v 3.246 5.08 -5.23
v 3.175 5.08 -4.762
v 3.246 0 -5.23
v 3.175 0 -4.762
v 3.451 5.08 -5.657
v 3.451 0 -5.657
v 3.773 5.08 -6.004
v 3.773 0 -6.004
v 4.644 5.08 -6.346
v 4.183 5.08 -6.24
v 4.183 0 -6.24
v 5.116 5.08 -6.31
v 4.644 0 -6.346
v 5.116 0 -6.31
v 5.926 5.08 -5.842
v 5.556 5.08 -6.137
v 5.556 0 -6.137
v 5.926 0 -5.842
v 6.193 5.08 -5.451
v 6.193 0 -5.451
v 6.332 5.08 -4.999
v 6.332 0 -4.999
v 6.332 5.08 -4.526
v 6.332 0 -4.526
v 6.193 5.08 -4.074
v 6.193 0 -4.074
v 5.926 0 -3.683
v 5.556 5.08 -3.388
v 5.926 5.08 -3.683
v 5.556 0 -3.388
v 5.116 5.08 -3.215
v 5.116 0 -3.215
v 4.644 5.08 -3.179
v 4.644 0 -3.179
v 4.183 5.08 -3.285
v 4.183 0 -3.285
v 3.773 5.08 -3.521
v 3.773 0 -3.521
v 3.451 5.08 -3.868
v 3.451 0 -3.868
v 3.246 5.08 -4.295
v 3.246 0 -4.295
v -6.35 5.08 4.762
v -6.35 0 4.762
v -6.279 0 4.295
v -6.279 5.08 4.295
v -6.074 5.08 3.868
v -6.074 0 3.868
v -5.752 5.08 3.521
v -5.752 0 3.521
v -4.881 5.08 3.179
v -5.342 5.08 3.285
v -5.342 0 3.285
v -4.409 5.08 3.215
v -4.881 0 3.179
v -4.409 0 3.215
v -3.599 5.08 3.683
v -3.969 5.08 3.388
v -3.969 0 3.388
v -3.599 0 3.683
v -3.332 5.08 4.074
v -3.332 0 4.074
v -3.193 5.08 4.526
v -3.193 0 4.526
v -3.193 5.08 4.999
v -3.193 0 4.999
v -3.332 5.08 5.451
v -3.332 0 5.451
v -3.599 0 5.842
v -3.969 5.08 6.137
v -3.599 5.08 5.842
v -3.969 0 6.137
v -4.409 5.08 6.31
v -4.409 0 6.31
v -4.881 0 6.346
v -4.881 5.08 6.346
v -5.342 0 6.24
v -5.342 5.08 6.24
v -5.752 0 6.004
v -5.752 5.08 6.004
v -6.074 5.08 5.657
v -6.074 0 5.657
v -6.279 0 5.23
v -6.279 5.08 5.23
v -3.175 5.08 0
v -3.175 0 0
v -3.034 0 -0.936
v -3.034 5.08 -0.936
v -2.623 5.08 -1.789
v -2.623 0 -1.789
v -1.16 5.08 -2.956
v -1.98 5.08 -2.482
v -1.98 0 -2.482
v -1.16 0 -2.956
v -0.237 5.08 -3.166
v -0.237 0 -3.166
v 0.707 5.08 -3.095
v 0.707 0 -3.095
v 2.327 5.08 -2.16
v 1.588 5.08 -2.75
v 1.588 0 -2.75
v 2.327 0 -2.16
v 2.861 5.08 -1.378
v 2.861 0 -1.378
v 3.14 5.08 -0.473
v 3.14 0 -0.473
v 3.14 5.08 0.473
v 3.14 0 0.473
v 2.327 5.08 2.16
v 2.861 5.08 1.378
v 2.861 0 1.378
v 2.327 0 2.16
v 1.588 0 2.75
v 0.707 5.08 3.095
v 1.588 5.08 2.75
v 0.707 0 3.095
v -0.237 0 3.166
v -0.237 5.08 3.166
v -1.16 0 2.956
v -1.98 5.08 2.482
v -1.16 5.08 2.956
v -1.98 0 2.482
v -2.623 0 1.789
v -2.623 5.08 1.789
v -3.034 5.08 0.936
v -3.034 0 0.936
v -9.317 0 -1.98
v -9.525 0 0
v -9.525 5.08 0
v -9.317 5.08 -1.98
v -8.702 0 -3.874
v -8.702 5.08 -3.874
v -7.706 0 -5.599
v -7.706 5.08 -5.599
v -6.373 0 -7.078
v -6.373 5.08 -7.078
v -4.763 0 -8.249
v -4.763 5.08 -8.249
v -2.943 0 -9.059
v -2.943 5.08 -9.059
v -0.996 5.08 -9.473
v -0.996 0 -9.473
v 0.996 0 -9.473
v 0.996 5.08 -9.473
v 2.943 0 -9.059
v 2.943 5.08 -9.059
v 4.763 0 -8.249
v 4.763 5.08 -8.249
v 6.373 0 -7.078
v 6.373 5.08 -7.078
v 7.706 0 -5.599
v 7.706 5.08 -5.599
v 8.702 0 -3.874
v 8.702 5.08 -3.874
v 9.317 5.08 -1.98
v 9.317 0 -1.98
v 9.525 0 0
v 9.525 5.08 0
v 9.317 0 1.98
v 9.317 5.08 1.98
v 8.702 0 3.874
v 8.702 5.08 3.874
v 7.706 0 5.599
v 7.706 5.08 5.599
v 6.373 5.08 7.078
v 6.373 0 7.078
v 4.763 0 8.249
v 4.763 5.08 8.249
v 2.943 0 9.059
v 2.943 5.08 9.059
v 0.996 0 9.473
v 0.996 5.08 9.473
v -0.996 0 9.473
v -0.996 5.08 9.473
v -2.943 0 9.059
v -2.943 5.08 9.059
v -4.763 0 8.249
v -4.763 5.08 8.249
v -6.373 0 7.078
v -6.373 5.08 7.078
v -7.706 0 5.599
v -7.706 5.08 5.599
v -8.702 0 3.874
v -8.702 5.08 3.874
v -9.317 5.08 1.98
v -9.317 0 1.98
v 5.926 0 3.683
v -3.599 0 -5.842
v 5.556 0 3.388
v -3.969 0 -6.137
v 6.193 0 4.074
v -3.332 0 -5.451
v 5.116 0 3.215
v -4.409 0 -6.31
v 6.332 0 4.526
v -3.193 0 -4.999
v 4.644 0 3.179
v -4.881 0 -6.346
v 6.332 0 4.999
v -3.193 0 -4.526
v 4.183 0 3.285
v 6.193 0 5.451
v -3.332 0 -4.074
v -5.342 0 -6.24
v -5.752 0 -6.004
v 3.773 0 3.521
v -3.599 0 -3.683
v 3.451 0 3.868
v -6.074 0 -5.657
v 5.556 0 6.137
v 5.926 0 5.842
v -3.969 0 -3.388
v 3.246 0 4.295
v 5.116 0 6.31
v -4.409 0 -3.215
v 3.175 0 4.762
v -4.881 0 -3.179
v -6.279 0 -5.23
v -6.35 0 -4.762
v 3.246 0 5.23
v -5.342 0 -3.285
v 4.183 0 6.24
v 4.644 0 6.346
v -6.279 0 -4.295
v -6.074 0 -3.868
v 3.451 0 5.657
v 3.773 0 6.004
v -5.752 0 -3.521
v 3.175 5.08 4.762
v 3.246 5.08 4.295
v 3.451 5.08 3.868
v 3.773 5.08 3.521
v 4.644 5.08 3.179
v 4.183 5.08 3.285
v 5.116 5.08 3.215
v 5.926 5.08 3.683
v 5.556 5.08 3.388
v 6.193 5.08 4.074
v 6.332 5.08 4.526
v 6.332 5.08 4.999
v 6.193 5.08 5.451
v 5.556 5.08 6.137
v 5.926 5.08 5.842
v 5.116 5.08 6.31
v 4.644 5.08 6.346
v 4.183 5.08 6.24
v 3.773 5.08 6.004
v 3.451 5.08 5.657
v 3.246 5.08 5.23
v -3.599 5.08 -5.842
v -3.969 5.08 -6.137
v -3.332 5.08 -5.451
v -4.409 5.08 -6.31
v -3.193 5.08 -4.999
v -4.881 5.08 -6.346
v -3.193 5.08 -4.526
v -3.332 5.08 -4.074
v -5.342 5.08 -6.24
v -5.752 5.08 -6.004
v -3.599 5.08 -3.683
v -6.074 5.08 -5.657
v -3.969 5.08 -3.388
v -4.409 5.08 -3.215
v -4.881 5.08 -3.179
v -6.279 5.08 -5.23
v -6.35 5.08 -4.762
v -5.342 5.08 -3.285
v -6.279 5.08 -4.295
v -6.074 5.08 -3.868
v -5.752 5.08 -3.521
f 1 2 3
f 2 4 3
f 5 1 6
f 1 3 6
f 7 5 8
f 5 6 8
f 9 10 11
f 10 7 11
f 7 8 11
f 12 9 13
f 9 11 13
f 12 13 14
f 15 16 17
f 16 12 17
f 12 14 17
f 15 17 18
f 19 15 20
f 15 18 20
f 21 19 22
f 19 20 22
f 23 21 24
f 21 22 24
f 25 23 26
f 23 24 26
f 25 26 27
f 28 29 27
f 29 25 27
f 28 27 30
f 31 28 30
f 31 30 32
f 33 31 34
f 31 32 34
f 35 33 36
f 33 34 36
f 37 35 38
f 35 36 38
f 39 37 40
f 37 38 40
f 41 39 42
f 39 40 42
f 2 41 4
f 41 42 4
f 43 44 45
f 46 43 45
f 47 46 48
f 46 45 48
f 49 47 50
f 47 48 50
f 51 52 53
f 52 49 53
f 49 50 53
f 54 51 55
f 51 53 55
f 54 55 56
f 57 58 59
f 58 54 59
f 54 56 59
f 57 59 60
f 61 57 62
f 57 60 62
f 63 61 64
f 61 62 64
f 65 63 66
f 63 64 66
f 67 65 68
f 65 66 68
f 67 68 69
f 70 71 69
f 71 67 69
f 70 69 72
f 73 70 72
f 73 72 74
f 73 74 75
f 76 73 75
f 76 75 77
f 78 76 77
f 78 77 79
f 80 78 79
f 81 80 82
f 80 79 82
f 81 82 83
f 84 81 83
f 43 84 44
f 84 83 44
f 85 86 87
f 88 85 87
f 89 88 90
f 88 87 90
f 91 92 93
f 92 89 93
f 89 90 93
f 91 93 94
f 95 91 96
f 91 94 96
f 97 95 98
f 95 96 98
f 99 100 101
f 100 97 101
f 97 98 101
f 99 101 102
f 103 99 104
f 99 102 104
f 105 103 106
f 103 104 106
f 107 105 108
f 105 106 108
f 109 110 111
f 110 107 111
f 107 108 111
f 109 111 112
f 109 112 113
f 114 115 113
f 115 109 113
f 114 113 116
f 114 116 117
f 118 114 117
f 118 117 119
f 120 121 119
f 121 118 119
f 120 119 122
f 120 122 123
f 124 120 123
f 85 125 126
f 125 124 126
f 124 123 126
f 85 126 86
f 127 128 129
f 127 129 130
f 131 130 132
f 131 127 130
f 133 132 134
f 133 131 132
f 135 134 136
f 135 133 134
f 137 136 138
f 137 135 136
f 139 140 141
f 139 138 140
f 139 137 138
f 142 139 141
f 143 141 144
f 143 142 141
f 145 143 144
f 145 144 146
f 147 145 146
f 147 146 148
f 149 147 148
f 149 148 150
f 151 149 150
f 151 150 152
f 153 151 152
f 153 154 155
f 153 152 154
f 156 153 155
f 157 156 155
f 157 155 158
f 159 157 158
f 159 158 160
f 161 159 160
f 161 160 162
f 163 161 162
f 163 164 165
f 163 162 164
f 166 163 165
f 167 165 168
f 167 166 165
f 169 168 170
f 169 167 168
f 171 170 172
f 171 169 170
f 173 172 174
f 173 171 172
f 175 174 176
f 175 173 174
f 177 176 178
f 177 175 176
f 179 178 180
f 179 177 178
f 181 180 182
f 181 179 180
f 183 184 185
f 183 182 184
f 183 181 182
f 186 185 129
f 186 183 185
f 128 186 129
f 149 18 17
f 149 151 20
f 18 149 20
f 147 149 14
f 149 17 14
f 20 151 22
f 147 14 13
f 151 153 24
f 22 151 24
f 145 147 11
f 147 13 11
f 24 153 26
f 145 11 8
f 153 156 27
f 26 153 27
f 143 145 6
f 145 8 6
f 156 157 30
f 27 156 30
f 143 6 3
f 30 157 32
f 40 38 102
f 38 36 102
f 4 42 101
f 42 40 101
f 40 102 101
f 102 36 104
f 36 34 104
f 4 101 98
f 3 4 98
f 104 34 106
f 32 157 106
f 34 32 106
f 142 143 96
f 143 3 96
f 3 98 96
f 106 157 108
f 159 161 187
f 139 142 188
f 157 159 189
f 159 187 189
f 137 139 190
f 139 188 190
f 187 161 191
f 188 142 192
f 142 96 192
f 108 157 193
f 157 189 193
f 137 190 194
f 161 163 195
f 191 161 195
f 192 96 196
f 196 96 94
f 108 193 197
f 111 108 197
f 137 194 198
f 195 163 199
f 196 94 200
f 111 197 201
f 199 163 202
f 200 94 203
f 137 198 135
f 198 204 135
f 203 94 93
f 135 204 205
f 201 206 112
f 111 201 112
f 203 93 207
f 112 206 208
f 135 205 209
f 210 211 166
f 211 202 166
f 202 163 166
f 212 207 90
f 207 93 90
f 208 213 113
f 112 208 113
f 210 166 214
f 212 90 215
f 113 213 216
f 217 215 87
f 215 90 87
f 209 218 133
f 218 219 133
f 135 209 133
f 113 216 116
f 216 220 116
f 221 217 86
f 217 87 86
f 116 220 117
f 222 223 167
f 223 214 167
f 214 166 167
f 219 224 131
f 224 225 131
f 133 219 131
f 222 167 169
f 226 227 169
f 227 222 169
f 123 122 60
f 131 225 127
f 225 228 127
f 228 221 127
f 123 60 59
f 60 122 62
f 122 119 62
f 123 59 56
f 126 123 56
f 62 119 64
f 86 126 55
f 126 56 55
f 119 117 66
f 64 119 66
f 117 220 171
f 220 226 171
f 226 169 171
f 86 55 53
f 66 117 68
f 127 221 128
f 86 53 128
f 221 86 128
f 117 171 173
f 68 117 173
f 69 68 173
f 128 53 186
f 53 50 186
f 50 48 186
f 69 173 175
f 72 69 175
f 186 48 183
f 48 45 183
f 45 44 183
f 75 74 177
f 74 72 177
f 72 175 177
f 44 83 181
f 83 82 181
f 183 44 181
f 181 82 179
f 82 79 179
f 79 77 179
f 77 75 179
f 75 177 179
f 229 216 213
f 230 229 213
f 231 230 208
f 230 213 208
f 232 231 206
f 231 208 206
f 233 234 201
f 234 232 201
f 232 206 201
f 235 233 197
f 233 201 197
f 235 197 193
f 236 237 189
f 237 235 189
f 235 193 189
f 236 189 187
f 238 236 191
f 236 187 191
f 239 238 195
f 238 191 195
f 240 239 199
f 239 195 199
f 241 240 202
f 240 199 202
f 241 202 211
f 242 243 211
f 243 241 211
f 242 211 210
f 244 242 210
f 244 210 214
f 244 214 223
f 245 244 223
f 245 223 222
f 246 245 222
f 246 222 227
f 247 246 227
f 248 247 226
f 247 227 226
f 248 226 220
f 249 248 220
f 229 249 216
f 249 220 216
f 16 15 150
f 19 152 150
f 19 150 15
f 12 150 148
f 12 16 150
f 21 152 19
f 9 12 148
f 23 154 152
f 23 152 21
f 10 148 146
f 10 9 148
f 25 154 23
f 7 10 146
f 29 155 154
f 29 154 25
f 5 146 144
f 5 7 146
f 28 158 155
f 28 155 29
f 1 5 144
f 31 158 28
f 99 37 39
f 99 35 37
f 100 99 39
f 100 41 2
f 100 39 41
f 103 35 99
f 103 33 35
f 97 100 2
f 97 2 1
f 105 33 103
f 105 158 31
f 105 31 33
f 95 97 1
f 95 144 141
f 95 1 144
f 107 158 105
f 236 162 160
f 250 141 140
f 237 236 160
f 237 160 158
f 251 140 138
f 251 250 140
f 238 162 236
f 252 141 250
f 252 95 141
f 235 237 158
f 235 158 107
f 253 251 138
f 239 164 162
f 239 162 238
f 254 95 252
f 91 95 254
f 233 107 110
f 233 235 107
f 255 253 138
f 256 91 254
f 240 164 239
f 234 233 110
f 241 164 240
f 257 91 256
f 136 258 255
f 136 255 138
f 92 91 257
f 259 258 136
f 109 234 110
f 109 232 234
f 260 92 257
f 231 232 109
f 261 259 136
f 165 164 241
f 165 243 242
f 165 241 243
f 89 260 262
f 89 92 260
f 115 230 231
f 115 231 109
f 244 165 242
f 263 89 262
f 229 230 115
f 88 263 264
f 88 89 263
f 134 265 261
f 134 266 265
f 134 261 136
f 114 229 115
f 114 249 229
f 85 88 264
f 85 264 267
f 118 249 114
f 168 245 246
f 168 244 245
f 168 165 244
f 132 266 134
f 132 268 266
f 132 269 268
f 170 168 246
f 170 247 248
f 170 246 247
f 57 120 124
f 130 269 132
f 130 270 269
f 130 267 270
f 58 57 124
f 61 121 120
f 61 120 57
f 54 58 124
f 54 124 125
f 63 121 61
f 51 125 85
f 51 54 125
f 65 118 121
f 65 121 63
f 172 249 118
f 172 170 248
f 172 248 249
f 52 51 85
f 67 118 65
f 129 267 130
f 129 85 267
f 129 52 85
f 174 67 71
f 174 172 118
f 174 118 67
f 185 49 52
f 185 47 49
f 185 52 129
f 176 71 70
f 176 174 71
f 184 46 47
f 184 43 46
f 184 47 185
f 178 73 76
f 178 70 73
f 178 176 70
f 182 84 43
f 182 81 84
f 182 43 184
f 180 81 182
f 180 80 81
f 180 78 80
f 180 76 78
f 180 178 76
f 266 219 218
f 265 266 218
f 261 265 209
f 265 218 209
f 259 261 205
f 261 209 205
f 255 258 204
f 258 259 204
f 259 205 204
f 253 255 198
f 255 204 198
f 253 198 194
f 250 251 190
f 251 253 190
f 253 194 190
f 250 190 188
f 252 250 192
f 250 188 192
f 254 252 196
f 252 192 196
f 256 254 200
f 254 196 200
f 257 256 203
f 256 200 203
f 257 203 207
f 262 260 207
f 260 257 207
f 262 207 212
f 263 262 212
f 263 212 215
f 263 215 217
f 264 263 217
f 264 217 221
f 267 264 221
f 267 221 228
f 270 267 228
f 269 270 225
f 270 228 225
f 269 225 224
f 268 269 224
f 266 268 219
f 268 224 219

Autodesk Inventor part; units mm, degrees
ref_plane "YZ Plane" through (0, 0, 0) normal (1, 0, 0) x (0, 1, 0)
ref_plane "XZ Plane" through (0, 0, 0) normal (0, 1, 0) x (-1, 0, 0)
ref_plane "XY Plane" through (0, 0, 0) normal (0, 0, 1) x (1, 0, 0)
sketch "Sketch1" plane through (0, 0, 0) normal (0, 1, 0) x (-1, 0, 0)
  circle A0 centre (0, 0) radius 9.525
  circle A1 centre (0, 0) radius 3.175
  circle A2 centre (4.7625, 4.7625) radius 1.5875
  circle A3 centre (-4.7625, 4.7625) radius 1.5875
  circle A4 centre (-4.7625, -4.7625) radius 1.5875
  circle A5 centre (4.7625, -4.7625) radius 1.5875
  dimension "d0" = 19.05
  dimension "d1" = 6.35
  dimension "d2" = 3.175
  dimension "d5" = 360
extrude "Extrusion1" add sketch "Sketch1" along normal blind 5.08
properties part number "Contracting Finger Motion Ring (motor to shaft)"
